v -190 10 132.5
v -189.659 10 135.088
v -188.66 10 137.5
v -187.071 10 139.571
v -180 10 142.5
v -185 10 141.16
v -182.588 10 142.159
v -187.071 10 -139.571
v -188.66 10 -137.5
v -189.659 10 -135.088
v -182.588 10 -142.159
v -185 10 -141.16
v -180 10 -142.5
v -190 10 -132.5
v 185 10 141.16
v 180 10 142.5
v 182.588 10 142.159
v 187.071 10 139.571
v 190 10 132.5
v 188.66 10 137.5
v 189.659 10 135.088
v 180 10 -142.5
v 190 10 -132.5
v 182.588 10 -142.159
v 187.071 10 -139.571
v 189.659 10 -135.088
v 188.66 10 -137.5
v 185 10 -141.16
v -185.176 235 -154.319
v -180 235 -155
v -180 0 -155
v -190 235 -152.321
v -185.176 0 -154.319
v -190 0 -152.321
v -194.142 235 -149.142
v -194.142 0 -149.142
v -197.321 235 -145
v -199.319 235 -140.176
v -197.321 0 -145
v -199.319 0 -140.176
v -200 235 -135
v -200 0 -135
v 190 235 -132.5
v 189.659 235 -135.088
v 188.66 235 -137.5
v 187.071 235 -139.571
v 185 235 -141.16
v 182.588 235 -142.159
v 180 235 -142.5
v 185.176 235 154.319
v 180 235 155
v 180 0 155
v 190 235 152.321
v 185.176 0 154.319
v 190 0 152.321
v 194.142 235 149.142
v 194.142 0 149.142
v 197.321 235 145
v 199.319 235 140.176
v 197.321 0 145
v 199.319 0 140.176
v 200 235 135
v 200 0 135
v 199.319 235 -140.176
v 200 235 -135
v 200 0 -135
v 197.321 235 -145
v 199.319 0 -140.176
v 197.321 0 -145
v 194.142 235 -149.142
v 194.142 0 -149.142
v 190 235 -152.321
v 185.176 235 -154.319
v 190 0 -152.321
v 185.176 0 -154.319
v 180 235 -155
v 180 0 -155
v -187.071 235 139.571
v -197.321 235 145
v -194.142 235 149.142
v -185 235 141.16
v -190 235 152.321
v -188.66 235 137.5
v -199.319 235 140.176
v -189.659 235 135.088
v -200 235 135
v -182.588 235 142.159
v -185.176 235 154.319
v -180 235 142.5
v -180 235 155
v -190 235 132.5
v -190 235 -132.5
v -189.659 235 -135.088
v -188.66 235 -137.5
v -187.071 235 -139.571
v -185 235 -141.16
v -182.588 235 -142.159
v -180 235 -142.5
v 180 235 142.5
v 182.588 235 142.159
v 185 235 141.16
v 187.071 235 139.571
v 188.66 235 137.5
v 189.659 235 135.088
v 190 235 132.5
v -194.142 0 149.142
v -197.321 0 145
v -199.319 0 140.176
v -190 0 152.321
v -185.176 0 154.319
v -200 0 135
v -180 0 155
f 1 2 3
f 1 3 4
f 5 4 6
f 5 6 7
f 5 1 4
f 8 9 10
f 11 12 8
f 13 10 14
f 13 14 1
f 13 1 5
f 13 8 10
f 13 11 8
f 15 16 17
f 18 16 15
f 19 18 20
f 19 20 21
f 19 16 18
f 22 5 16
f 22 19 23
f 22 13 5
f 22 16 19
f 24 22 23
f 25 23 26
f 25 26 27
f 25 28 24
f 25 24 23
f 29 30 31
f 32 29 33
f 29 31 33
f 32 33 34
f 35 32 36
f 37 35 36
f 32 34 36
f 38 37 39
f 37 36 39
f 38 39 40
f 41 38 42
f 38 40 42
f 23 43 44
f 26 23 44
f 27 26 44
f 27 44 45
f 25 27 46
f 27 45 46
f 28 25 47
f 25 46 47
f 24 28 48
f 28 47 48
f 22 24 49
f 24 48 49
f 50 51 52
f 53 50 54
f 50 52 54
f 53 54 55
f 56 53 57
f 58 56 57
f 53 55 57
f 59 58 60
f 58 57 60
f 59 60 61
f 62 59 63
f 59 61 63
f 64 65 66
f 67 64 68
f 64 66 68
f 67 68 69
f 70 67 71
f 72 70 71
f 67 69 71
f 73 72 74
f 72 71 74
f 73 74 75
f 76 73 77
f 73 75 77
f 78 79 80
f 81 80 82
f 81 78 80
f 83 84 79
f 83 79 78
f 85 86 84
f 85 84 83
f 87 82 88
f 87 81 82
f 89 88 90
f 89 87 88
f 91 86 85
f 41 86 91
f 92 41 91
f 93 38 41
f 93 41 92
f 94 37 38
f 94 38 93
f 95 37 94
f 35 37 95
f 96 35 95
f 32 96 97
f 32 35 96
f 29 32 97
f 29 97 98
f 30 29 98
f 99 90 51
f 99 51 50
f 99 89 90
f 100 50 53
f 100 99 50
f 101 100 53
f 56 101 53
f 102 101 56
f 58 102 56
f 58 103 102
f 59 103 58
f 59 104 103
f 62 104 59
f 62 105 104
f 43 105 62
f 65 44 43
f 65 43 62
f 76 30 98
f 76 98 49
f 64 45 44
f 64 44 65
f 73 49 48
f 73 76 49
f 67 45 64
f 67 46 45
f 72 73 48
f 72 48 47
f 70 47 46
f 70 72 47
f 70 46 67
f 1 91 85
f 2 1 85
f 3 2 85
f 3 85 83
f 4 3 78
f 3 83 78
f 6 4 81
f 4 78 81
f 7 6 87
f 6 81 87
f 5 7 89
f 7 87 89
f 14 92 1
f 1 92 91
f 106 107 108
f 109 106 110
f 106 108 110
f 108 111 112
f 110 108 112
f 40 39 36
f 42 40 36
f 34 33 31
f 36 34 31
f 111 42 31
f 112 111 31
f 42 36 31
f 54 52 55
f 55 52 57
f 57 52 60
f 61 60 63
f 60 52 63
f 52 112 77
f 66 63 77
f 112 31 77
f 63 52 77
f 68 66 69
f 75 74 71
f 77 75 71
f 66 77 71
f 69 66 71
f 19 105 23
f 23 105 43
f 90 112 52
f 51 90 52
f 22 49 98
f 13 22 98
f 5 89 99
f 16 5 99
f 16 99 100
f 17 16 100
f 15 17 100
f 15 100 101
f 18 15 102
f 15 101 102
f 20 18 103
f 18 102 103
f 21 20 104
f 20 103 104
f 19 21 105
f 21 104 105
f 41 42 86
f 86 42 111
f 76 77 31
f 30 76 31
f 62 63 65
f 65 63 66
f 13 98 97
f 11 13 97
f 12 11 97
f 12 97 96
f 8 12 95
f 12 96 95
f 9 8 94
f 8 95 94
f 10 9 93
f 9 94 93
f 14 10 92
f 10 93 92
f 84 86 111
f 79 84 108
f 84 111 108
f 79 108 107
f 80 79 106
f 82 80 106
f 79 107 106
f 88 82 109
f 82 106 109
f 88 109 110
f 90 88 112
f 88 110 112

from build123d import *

# Parameters (mm, degrees)
BOSS_EXTRUDE1_DEPTH = 235
CUT_EXTRUDE1_DEPTH  = 225


with BuildPart() as part:
    # Sketch1 → Boss-Extrude1 (new body)
    with BuildSketch(Plane(origin=(0, 0, 0), x_dir=(1, 0, 0), z_dir=(0, 1, 0))):
        with BuildLine():
            Line((-180, -155), (180, -155))
            ThreePointArc((180, -155), (194.142135624, -149.142135624), (200, -135))
            Line((200, -135), (200, 135))
            ThreePointArc((200, 135), (194.142135624, 149.142135624), (180, 155))
            Line((180, 155), (-180, 155))
            ThreePointArc((-180, 155), (-194.142135624, 149.142135624), (-200, 135))
            Line((-200, 135), (-200, -135))
            ThreePointArc((-200, -135), (-194.142135624, -149.142135624), (-180, -155))
        make_face()
    extrude(amount=BOSS_EXTRUDE1_DEPTH)

    # Sketch2 → Cut-Extrude1 (cut)
    with BuildSketch(Plane(origin=(0, 235, 0), x_dir=(1, 0, 0), z_dir=(0, 1, 0))):
        with BuildLine():
            Line((-180, -142.5), (180, -142.5))
            ThreePointArc((180, -142.5), (187.071067812, -139.571067812), (190, -132.5))
            Line((190, -132.5), (190, 132.5))
            ThreePointArc((190, 132.5), (187.071067812, 139.571067812), (180, 142.5))
            Line((180, 142.5), (-180, 142.5))
            ThreePointArc((-180, 142.5), (-187.071067812, 139.571067812), (-190, 132.5))
            Line((-190, 132.5), (-190, -132.5))
            ThreePointArc((-190, -132.5), (-187.071067812, -139.571067812), (-180, -142.5))
        make_face()
    extrude(amount=-CUT_EXTRUDE1_DEPTH, mode=Mode.SUBTRACT)


solid = part.part
